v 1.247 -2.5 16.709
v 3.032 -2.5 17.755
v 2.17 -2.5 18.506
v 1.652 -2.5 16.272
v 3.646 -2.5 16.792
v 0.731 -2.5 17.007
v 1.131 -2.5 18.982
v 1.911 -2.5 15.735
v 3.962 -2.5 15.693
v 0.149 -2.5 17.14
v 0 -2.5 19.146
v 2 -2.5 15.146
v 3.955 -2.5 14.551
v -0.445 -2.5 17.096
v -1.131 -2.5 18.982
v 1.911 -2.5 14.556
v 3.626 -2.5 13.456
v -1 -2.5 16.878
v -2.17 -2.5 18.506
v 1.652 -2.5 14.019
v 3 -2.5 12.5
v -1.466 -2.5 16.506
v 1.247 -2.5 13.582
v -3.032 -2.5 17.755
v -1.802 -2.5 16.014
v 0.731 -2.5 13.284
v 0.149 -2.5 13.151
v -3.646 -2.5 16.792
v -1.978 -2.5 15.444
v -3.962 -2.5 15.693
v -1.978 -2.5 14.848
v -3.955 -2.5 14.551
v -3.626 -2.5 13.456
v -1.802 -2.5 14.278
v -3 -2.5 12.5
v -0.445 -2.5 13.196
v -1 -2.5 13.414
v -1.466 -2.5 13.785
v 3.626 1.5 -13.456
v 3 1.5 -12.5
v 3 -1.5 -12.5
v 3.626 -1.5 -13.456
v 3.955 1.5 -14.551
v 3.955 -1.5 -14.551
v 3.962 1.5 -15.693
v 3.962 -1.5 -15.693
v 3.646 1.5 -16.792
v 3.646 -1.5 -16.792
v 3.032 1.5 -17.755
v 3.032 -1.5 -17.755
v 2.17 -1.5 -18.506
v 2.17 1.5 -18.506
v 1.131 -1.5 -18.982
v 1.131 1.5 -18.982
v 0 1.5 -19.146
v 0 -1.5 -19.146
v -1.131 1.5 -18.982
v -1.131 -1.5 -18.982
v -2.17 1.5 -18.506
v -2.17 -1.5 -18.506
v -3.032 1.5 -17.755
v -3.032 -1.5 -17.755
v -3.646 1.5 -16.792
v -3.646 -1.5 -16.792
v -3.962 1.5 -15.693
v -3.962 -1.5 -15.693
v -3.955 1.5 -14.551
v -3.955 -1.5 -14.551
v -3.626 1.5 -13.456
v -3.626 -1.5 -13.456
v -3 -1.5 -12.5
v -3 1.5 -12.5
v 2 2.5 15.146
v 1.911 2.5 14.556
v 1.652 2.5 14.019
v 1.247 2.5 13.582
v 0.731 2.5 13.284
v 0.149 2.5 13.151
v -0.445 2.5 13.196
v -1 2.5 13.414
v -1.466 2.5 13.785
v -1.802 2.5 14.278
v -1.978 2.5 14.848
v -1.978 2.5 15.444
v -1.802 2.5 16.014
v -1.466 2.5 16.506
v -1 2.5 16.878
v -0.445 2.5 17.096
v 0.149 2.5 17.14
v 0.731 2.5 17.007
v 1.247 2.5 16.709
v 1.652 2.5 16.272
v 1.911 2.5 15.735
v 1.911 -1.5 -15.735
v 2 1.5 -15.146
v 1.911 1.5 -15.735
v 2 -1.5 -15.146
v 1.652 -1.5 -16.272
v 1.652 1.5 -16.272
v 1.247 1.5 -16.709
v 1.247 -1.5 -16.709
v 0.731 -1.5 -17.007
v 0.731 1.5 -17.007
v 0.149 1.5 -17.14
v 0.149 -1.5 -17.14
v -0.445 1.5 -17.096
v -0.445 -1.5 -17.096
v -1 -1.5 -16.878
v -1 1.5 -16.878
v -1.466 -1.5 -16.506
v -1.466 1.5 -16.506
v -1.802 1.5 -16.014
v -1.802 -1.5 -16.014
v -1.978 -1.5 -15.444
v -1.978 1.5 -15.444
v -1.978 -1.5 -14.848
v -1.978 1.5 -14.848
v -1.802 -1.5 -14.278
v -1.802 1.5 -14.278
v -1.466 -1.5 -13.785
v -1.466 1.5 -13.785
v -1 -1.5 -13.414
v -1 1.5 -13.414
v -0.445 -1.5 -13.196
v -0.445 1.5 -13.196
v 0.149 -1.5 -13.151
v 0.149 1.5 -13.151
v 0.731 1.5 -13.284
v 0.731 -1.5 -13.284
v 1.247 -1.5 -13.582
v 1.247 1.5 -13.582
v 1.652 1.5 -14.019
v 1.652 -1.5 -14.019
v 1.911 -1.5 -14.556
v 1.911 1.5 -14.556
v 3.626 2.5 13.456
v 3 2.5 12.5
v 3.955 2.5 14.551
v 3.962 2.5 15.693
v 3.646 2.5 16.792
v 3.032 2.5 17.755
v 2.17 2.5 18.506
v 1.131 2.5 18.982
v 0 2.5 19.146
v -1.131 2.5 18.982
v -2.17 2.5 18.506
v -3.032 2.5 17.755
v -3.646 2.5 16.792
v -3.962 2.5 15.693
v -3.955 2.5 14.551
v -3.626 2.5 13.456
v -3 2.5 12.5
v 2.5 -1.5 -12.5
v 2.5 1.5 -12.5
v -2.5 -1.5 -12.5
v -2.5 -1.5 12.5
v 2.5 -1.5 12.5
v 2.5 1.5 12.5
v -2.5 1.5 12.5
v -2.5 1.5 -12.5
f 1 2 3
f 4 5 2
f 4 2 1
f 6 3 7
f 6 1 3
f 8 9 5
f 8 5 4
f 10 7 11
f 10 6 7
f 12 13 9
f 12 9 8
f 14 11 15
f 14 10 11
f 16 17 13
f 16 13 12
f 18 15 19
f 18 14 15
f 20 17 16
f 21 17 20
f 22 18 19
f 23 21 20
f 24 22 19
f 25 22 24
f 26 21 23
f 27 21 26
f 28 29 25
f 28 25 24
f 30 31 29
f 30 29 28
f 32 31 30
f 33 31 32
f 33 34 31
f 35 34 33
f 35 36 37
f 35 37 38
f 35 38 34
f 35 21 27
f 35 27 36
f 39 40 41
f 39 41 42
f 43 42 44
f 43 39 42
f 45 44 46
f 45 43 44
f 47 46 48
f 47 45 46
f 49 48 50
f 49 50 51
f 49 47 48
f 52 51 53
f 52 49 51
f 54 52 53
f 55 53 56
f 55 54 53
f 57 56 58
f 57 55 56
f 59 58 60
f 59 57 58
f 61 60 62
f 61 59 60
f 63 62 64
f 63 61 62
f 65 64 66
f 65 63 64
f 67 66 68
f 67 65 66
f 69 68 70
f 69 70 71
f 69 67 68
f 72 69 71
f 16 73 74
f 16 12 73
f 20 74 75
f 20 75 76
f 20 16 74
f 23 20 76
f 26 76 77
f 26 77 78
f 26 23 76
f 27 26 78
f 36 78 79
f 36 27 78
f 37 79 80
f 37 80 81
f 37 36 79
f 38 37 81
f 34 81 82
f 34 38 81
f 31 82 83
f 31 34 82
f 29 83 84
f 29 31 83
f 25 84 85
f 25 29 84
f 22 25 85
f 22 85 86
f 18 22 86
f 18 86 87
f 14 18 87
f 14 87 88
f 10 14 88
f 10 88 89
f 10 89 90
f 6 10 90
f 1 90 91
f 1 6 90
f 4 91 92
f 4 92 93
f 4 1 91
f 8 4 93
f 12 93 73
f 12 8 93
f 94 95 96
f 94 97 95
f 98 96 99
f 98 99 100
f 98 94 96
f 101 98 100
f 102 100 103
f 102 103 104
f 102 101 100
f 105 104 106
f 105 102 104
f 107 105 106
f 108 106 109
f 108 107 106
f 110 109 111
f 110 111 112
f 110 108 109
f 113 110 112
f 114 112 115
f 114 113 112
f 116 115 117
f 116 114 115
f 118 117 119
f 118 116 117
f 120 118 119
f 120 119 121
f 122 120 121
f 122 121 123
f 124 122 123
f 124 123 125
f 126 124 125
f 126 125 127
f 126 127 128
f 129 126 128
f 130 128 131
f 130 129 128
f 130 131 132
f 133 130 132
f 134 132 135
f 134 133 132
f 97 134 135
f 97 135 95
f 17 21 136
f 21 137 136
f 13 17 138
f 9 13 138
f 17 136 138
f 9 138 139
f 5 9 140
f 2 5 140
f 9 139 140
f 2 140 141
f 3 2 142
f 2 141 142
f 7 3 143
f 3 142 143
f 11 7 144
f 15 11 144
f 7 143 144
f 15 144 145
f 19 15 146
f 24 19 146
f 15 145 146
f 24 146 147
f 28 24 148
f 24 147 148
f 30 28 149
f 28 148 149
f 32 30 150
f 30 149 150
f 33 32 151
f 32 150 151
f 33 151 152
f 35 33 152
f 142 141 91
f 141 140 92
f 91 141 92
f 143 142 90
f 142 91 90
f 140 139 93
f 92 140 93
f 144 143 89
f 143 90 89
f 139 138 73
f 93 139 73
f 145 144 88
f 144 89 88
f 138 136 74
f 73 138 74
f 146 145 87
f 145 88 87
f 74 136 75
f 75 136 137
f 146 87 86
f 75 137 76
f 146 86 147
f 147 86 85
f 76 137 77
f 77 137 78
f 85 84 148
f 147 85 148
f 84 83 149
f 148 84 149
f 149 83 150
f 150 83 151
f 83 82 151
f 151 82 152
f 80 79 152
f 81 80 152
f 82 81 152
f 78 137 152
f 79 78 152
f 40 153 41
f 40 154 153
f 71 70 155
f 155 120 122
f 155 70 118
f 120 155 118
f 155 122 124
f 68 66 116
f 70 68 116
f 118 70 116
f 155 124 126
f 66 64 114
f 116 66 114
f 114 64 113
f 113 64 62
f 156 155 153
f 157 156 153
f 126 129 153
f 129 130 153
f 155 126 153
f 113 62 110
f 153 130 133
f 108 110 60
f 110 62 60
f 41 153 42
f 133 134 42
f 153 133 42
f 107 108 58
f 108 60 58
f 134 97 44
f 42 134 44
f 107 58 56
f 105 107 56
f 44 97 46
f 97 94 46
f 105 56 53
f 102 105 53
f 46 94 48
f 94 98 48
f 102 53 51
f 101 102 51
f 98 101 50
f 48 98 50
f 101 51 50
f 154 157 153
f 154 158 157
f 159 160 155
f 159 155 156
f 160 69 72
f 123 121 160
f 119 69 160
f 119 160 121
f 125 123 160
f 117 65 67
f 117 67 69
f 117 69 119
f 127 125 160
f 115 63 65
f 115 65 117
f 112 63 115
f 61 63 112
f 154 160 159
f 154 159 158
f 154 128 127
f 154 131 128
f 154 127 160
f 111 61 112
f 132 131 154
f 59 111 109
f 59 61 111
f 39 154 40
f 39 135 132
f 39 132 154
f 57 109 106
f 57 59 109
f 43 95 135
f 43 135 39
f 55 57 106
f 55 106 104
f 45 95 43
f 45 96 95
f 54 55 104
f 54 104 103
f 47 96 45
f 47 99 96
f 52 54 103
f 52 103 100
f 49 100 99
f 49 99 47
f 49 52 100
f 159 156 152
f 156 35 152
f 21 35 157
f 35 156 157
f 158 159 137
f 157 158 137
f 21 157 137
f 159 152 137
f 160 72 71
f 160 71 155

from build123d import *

# Parameters (mm, degrees)
SKETCH1_R           = 2
BOSS_EXTRUDE2_DEPTH = 1.5
SKETCH2_R           = 2
BOSS_EXTRUDE3_DEPTH = 2.5


with BuildPart() as part:
    # Sketch1 → Boss-Extrude2 (new body, symmetric)
    with BuildSketch(Plane(origin=(0, 0, 0), x_dir=(1, 0, 0), z_dir=(0, 1, 0))):
        with BuildLine():
            Line((2.5, 12.499999806), (3, 12.499999806))
            ThreePointArc((3, 12.499999806), (0, 19.145751117), (-3, 12.499999806))
            Line((-3, 12.499999806), (-2.5, 12.499999806))
            Line((-2.5, 12.499999806), (-2.5, -12.499999806))
            Line((-2.5, -12.499999806), (2.5, -12.499999806))
            Line((2.5, -12.499999806), (2.5, 12.499999806))
        make_face()
        with Locations((0, 15.145751117)):
            Circle(SKETCH1_R, mode=Mode.SUBTRACT)
    extrude(amount=BOSS_EXTRUDE2_DEPTH, both=True)

    # Sketch2 → Boss-Extrude3 (add, symmetric)
    with BuildSketch(Plane(origin=(0, 0, 0), x_dir=(1, 0, 0), z_dir=(0, 1, 0))):
        with BuildLine():
            Line((-3, -12.499999806), (3, -12.499999806))
            ThreePointArc((3, -12.499999806), (0, -19.145751117), (-3, -12.499999806))
        make_face()
        with Locations((0, -15.145751117)):
            Circle(SKETCH2_R, mode=Mode.SUBTRACT)
    extrude(amount=BOSS_EXTRUDE3_DEPTH, both=True)


solid = part.part
